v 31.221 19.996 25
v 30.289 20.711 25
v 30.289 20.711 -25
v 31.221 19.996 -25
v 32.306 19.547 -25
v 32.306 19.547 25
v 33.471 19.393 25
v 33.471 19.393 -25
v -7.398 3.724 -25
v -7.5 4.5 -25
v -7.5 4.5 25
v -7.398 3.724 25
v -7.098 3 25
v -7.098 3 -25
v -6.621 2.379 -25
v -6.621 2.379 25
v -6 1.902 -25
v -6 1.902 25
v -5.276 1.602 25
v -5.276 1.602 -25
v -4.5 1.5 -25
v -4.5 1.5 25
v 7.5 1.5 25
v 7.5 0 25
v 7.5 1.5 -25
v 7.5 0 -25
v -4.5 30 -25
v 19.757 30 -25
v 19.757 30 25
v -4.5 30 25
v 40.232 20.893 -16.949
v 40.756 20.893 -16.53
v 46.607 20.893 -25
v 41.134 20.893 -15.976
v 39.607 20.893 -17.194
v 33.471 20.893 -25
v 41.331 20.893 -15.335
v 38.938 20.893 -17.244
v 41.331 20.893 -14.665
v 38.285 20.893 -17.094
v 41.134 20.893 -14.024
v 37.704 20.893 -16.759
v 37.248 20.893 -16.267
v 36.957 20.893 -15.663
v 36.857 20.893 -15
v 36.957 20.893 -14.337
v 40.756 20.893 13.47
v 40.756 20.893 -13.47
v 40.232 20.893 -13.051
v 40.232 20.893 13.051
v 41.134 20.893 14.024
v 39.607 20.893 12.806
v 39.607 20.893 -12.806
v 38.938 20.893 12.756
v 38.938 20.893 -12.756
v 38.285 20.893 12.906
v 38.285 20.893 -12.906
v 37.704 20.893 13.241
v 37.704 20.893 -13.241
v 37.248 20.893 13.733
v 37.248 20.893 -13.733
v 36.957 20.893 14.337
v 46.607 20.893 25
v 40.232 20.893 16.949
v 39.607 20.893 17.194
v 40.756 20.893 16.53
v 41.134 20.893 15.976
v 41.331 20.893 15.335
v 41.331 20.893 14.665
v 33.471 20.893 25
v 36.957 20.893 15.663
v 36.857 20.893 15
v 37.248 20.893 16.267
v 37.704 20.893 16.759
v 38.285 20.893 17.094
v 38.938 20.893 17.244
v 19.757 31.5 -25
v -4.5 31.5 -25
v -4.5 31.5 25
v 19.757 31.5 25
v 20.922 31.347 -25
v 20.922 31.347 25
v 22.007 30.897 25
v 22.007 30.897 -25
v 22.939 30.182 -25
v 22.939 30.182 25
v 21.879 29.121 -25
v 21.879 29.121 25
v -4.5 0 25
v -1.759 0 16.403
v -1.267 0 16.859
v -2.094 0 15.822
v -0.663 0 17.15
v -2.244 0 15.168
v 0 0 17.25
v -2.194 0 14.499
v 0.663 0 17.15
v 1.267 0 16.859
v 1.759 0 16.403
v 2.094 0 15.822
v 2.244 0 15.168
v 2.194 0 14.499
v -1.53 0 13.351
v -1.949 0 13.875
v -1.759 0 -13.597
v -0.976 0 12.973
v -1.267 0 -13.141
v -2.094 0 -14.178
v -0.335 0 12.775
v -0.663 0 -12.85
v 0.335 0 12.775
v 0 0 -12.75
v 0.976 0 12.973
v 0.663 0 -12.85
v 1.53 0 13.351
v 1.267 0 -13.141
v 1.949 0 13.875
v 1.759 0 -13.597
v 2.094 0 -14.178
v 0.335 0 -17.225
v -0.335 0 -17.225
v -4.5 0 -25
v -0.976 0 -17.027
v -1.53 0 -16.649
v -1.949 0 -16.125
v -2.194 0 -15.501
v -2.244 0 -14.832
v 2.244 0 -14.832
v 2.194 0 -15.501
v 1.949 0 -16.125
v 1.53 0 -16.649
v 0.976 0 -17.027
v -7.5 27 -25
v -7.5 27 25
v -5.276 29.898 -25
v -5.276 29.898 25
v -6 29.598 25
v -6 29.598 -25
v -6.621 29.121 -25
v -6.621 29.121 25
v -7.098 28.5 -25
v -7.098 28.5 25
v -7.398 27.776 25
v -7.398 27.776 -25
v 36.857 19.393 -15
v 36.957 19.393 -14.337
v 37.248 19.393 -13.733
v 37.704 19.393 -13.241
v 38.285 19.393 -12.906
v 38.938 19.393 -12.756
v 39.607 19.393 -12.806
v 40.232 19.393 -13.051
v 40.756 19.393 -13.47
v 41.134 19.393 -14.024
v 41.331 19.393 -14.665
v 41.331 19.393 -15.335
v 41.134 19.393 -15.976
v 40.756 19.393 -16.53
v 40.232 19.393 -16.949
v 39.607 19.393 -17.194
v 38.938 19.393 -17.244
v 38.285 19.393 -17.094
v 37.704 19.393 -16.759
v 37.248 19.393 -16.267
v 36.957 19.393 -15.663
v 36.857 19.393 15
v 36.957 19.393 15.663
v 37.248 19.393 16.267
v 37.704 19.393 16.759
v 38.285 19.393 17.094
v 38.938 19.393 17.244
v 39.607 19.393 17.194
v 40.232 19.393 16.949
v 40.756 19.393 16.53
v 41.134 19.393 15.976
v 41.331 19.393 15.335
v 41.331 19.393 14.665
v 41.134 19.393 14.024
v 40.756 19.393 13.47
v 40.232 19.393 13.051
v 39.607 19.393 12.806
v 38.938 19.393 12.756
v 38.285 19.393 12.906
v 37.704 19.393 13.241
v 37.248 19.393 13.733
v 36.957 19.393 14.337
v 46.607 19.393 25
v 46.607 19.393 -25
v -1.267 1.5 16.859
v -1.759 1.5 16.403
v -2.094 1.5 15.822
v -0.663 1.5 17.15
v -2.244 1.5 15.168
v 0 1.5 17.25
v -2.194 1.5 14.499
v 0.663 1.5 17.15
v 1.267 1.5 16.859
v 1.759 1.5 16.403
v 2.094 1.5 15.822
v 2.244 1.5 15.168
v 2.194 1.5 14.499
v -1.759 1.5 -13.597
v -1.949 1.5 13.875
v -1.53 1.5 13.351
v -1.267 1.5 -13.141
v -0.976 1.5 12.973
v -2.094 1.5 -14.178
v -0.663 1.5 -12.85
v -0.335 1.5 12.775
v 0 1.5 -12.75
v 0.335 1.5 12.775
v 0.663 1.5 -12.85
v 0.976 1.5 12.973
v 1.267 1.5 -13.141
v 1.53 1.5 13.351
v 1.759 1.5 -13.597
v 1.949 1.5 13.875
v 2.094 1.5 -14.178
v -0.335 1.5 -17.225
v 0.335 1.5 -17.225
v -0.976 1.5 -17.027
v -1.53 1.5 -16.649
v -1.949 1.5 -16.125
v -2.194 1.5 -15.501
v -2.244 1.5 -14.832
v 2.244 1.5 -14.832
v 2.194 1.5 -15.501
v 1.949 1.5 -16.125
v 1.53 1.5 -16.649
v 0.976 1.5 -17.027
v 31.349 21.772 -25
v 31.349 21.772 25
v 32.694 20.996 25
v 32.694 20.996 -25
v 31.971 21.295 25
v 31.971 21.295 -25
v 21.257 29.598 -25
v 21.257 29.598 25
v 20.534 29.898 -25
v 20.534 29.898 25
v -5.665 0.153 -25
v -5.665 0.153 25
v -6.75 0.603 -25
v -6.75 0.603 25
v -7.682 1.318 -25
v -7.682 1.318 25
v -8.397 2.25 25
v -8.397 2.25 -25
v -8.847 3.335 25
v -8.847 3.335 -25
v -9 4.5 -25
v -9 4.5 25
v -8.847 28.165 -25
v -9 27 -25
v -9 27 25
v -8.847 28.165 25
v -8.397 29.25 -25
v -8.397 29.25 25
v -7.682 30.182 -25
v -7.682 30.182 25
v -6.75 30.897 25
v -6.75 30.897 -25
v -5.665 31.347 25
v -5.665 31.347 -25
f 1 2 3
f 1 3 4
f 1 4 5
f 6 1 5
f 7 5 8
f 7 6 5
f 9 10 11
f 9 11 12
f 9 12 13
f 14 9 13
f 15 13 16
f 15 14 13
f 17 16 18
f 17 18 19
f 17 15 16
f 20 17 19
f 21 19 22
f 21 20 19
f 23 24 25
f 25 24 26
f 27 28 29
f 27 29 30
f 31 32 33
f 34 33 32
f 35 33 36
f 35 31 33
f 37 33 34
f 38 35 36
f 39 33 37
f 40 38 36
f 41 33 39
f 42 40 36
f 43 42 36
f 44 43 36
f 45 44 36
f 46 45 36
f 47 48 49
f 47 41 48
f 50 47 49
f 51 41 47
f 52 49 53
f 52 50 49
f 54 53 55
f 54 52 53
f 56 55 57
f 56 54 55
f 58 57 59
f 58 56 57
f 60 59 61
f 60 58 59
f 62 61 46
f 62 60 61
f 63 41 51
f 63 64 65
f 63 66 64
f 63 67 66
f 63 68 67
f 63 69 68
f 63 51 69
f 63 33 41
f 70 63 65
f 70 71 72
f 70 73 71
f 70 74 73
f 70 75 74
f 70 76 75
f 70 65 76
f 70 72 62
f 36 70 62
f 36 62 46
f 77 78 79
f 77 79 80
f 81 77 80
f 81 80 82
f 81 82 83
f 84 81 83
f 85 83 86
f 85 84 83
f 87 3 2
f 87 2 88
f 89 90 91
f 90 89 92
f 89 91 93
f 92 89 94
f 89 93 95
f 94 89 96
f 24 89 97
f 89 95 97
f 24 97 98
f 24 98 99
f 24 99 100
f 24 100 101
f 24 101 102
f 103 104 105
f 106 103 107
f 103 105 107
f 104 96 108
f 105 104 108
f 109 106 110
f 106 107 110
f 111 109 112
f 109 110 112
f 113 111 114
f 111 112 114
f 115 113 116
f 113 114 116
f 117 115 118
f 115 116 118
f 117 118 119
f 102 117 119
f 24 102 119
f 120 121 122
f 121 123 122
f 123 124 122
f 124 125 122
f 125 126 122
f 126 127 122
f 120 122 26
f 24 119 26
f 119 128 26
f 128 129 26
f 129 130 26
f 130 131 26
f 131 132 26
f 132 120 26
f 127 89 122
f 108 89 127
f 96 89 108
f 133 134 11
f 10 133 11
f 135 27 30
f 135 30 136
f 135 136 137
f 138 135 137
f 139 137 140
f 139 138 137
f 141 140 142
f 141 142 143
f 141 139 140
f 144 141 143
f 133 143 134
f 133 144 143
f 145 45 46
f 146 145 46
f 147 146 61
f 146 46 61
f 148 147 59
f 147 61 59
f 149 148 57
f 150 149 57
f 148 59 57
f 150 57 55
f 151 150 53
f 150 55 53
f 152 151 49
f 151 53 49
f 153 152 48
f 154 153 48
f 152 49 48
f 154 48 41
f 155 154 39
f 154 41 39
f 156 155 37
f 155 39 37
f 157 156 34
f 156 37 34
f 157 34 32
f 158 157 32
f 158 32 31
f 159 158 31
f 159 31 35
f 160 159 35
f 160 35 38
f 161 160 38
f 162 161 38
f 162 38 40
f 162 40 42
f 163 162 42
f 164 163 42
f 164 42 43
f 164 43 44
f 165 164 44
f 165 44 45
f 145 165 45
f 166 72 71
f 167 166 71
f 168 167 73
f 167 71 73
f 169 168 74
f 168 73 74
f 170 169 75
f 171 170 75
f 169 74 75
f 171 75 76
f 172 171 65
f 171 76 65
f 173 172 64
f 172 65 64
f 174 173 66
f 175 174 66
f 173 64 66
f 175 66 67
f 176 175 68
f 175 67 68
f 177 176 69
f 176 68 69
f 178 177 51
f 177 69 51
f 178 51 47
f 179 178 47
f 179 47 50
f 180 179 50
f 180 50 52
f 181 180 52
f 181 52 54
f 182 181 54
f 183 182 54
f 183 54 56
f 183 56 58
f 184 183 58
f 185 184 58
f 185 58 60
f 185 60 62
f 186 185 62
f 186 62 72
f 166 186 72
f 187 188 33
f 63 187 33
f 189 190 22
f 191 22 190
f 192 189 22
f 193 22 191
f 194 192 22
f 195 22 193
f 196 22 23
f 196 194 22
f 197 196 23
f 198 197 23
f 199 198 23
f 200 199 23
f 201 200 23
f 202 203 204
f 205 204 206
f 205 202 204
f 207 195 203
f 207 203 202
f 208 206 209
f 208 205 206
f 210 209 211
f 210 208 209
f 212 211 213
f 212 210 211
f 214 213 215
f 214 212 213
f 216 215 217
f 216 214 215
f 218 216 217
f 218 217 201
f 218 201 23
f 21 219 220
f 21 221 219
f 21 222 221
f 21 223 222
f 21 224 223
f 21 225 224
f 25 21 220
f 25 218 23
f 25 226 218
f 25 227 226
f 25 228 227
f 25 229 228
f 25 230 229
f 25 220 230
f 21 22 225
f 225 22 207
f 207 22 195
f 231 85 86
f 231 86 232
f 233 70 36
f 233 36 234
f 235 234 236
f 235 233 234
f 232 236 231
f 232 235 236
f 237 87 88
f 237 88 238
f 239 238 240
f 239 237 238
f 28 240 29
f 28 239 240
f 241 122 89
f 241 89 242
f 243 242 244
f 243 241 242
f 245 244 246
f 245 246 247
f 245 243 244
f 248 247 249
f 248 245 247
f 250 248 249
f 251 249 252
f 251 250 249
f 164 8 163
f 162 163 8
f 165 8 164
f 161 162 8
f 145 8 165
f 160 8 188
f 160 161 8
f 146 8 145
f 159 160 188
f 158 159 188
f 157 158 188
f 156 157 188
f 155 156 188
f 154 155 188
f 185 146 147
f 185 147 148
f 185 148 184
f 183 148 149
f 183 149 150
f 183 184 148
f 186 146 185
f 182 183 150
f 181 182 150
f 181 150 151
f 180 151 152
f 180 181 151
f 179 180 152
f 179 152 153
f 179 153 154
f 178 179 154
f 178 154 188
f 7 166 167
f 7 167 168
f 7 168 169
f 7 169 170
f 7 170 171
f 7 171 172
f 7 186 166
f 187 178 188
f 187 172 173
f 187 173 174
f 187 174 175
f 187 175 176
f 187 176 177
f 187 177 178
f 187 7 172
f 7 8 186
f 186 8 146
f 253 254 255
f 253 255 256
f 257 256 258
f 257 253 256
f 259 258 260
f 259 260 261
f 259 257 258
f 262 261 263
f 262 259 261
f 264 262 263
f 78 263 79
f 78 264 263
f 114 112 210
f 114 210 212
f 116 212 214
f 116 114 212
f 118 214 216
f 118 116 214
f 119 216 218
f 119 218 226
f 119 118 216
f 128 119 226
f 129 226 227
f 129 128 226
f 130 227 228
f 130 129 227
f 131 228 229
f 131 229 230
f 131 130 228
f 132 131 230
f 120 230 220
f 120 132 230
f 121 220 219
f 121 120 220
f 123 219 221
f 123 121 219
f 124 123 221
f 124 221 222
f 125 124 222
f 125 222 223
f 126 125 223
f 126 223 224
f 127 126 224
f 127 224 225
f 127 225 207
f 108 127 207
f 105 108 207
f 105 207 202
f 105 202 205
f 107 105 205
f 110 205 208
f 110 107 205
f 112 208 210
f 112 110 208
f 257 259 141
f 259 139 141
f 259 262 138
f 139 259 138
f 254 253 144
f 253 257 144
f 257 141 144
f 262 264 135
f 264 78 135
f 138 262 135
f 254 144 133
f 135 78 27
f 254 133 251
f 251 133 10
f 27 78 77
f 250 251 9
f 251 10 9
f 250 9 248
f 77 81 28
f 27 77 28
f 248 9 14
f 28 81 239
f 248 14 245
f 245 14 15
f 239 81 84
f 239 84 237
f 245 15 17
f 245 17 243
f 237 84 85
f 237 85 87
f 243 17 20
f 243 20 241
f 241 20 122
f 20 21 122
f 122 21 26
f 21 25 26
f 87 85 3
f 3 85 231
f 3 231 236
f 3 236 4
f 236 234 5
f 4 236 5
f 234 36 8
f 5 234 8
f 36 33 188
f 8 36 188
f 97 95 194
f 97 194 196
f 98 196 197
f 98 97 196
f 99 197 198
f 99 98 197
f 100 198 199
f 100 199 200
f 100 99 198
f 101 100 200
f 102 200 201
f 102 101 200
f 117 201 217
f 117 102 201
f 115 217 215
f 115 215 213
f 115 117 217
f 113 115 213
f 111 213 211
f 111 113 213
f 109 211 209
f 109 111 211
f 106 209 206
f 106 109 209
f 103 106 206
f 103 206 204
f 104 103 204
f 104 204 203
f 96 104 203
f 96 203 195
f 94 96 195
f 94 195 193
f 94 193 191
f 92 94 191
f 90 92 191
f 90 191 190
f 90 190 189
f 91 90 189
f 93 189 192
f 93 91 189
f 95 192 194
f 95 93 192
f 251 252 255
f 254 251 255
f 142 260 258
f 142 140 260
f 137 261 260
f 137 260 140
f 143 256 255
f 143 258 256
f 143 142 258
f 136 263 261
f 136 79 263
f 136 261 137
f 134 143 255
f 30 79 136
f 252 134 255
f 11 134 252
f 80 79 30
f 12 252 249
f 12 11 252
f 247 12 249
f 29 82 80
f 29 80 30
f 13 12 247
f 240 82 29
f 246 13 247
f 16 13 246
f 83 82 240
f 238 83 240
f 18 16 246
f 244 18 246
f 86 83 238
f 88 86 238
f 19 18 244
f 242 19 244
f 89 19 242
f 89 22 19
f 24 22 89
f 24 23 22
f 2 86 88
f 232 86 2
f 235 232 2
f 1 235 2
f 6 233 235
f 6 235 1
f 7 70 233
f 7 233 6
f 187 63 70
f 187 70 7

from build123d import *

# Parameters (mm, degrees)
SKETCH1_W                    = 15
SKETCH1_H                    = 50
SKETCH1_R                    = 2.25
BASE_FLANGE1_DEPTH           = 1.5
EDGE_FLANGE1_STRIP_W         = 12
EDGE_FLANGE1_STRIP_H         = 1.5
EDGE_FLANGE1_STRIP_CUT_DEPTH = 50
EDGE_FLANGE1_DEPTH           = 50
EDGE_FLANGE2_STRIP_W         = 12
EDGE_FLANGE2_STRIP_H         = 1.5
EDGE_FLANGE2_STRIP_CUT_DEPTH = 50
EDGE_FLANGE2_DEPTH           = 50
EDGE_FLANGE3_STRIP_CUT_DEPTH = 50
EDGE_FLANGE3_DEPTH           = 50
EDGE_FLANGE4_STRIP_CUT_DEPTH = 50
EDGE_FLANGE4_DEPTH           = 50
SKETCH19_R                   = 2.25
CUT_EXTRUDE1_DEPTH           = 57.865713883


# Sheet-metal steps are written as plain solids
with BuildPart() as part:
    # Sketch1 → Base-Flange1 (new body)
    with BuildSketch(Plane(origin=(0, 0, 0), x_dir=(1, 0, 0), z_dir=(0, 1, 0))):
        Rectangle(SKETCH1_W, SKETCH1_H)
        with Locations(Location((0, 15, 0), (0, 0, 270))):
            Circle(SKETCH1_R, mode=Mode.SUBTRACT)
        with Locations(Location((0, -15, 0), (0, 0, 270))):
            Circle(SKETCH1_R, mode=Mode.SUBTRACT)
    extrude(amount=BASE_FLANGE1_DEPTH)

    # Edge-Flange1 strip (across the edge) → Edge-Flange1 strip cut (cut)
    with BuildSketch(Plane(origin=(-7.5, 1.5, -25), x_dir=(1, 0, 0), z_dir=(0, 0, 1))):
        with Locations((-3, -0.75)):
            Rectangle(EDGE_FLANGE1_STRIP_W, EDGE_FLANGE1_STRIP_H)
    extrude(amount=EDGE_FLANGE1_STRIP_CUT_DEPTH, mode=Mode.SUBTRACT)

    # Edge-Flange1 section (across the edge) → Edge-Flange1 (add)
    with BuildSketch(Plane(origin=(-7.5, 1.5, -25), x_dir=(1, 0, 0), z_dir=(0, 0, 1))):
        with BuildLine():
            Line((-1.5, 3), (-1.5, 28.5))
            Line((-1.5, 28.5), (0, 28.5))
            Line((0, 28.5), (0, 3))
            ThreePointArc((0, 3), (0.878679656, 0.878679656), (3, 0))
            Line((3, 0), (3, -1.5))
            ThreePointArc((3, -1.5), (-0.181980515, -0.181980515), (-1.5, 3))
        make_face()
    extrude(amount=EDGE_FLANGE1_DEPTH)

    # Edge-Flange2 strip (across the edge) → Edge-Flange2 strip cut (cut)
    with BuildSketch(Plane(origin=(-7.5, 30, -25), x_dir=(0, -1, 0), z_dir=(0, 0, 1))):
        with Locations((-3, -0.75)):
            Rectangle(EDGE_FLANGE2_STRIP_W, EDGE_FLANGE2_STRIP_H)
    extrude(amount=EDGE_FLANGE2_STRIP_CUT_DEPTH, mode=Mode.SUBTRACT)

    # Edge-Flange2 section (across the edge) → Edge-Flange2 (add)
    with BuildSketch(Plane(origin=(-7.5, 30, -25), x_dir=(0, -1, 0), z_dir=(0, 0, 1))):
        with BuildLine():
            Line((-1.5, 3), (-1.5, 28.5))
            Line((-1.5, 28.5), (0, 28.5))
            Line((0, 28.5), (0, 3))
            ThreePointArc((0, 3), (0.878679656, 0.878679656), (3, 0))
            Line((3, 0), (3, -1.5))
            ThreePointArc((3, -1.5), (-0.181980515, -0.181980515), (-1.5, 3))
        make_face()
    extrude(amount=EDGE_FLANGE2_DEPTH)

    # Edge-Flange3 strip (across the edge) → Edge-Flange3 strip cut (cut)
    with BuildSketch(Plane(origin=(21, 30, -25), x_dir=(-0.7071067811865389, -0.7071067811865561, 0), z_dir=(0, 0, 1))):
        Polygon((-8.66726189, 6.545941546), (-0.181980515, -1.939339828), (0.878679656, -0.878679656), (-7.606601718, 7.606601718), align=None)
    extrude(amount=EDGE_FLANGE3_STRIP_CUT_DEPTH, mode=Mode.SUBTRACT)

    # Edge-Flange3 section (across the edge) → Edge-Flange3 (add)
    with BuildSketch(Plane(origin=(21, 30, -25), x_dir=(-0.7071067811865389, -0.7071067811865561, 0), z_dir=(0, 0, 1))):
        with BuildLine():
            Line((-1.5, 1.242640687), (-1.5, 14.378679656))
            Line((-1.5, 14.378679656), (0, 14.378679656))
            Line((0, 14.378679656), (0, 1.242640687))
            ThreePointArc((0, 1.242640687), (0.228361402, 0.09459039), (0.878679656, -0.878679656))
            Line((0.878679656, -0.878679656), (-0.181980515, -1.939339828))
            ThreePointArc((-0.181980515, -1.939339828), (-1.157457896, -0.479434759), (-1.5, 1.242640687))
        make_face()
    extrude(amount=EDGE_FLANGE3_DEPTH)

    # Edge-Flange4 strip (across the edge) → Edge-Flange4 strip cut (cut)
    with BuildSketch(Plane(origin=(32.227922061, 20.893398282, 25), x_dir=(0, 1, 0), z_dir=(0, 0, -1))):
        Polygon((-8.66726189, 6.545941546), (-0.181980515, -1.939339828), (0.878679656, -0.878679656), (-7.606601718, 7.606601718), align=None)
    extrude(amount=EDGE_FLANGE4_STRIP_CUT_DEPTH, mode=Mode.SUBTRACT)

    # Edge-Flange4 section (across the edge) → Edge-Flange4 (add)
    with BuildSketch(Plane(origin=(32.227922061, 20.893398282, 25), x_dir=(0, 1, 0), z_dir=(0, 0, -1))):
        with BuildLine():
            Line((-1.5, 1.242640687), (-1.5, 14.378679656))
            Line((-1.5, 14.378679656), (0, 14.378679656))
            Line((0, 14.378679656), (0, 1.242640687))
            ThreePointArc((0, 1.242640687), (0.228361402, 0.09459039), (0.878679656, -0.878679656))
            Line((0.878679656, -0.878679656), (-0.181980515, -1.939339828))
            ThreePointArc((-0.181980515, -1.939339828), (-1.157457896, -0.479434759), (-1.5, 1.242640687))
        make_face()
    extrude(amount=EDGE_FLANGE4_DEPTH)

    # Sketch19 → Cut-Extrude1 (cut, through all)
    with BuildSketch(Plane(origin=(0, 20.893398282, 0), x_dir=(1, 0, 0), z_dir=(0, 1, 0))):
        with Locations(Location((39.106601718, 15, 0), (0, 0, 180))):
            Circle(SKETCH19_R)
        with Locations(Location((39.106601718, -15, 0), (0, 0, 180))):
            Circle(SKETCH19_R)
    extrude(amount=-CUT_EXTRUDE1_DEPTH, mode=Mode.SUBTRACT)


solid = part.part
